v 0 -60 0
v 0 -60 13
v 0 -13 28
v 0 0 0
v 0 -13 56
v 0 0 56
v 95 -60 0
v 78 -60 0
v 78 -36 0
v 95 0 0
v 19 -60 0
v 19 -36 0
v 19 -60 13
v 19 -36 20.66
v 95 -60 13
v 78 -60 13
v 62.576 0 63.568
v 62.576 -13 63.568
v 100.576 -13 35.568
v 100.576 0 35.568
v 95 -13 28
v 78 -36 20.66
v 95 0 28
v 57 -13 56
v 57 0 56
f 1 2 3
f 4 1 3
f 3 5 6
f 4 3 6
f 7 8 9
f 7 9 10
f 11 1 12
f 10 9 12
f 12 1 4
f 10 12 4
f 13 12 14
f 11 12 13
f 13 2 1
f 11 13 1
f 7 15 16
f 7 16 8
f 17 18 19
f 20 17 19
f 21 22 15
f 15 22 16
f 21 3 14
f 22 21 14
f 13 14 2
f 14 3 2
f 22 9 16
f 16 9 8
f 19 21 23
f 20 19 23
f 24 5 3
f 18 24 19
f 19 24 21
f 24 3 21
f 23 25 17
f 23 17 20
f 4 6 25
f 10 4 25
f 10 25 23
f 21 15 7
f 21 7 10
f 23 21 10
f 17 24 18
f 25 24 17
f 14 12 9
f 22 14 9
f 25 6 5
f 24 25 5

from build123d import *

# Parameters (mm, degrees)
F1_DEPTH = 95
F3_DEPTH = 13.001
F4_W     = 59
F4_H     = 24
F5_DEPTH = 56.001
F6_DEPTH = 9.4


# Not quite as in the source:
# - a feature names something its author has since deleted; it is built from what else it names


with BuildPart() as f1:
    # F0 (on Right) → F1 (new body)
    with BuildSketch(Plane.YZ):
        Polygon((-60, 13), (-60, 0), (0, 0), (0, 56), (-13, 56), (-13, 28), align=None)
    extrude(amount=F1_DEPTH)

    # F2 (on face) → F3 (cut, through all)
    with BuildSketch(Plane.XZ.offset(13)):
        Polygon((95, 56), (57, 56), (95, 28), align=None)
    extrude(amount=-F3_DEPTH, mode=Mode.SUBTRACT)

    # F4 (on face) → F5 (cut, through all)
    with BuildSketch(Plane(origin=(0, 0, 0), x_dir=(1, 0, 0), z_dir=(0, 0, -1))):
        with Locations((48.5, 48)):
            Rectangle(F4_W, F4_H)
    extrude(amount=-F5_DEPTH, mode=Mode.SUBTRACT)

    # F6 (add): a face of the model
    f6_faces = [f1.faces().sort_by_distance(p)[0] for p in [
        (76, -6.5, 42),
    ]]
    extrude(f6_faces, amount=F6_DEPTH)


solid = f1.part
